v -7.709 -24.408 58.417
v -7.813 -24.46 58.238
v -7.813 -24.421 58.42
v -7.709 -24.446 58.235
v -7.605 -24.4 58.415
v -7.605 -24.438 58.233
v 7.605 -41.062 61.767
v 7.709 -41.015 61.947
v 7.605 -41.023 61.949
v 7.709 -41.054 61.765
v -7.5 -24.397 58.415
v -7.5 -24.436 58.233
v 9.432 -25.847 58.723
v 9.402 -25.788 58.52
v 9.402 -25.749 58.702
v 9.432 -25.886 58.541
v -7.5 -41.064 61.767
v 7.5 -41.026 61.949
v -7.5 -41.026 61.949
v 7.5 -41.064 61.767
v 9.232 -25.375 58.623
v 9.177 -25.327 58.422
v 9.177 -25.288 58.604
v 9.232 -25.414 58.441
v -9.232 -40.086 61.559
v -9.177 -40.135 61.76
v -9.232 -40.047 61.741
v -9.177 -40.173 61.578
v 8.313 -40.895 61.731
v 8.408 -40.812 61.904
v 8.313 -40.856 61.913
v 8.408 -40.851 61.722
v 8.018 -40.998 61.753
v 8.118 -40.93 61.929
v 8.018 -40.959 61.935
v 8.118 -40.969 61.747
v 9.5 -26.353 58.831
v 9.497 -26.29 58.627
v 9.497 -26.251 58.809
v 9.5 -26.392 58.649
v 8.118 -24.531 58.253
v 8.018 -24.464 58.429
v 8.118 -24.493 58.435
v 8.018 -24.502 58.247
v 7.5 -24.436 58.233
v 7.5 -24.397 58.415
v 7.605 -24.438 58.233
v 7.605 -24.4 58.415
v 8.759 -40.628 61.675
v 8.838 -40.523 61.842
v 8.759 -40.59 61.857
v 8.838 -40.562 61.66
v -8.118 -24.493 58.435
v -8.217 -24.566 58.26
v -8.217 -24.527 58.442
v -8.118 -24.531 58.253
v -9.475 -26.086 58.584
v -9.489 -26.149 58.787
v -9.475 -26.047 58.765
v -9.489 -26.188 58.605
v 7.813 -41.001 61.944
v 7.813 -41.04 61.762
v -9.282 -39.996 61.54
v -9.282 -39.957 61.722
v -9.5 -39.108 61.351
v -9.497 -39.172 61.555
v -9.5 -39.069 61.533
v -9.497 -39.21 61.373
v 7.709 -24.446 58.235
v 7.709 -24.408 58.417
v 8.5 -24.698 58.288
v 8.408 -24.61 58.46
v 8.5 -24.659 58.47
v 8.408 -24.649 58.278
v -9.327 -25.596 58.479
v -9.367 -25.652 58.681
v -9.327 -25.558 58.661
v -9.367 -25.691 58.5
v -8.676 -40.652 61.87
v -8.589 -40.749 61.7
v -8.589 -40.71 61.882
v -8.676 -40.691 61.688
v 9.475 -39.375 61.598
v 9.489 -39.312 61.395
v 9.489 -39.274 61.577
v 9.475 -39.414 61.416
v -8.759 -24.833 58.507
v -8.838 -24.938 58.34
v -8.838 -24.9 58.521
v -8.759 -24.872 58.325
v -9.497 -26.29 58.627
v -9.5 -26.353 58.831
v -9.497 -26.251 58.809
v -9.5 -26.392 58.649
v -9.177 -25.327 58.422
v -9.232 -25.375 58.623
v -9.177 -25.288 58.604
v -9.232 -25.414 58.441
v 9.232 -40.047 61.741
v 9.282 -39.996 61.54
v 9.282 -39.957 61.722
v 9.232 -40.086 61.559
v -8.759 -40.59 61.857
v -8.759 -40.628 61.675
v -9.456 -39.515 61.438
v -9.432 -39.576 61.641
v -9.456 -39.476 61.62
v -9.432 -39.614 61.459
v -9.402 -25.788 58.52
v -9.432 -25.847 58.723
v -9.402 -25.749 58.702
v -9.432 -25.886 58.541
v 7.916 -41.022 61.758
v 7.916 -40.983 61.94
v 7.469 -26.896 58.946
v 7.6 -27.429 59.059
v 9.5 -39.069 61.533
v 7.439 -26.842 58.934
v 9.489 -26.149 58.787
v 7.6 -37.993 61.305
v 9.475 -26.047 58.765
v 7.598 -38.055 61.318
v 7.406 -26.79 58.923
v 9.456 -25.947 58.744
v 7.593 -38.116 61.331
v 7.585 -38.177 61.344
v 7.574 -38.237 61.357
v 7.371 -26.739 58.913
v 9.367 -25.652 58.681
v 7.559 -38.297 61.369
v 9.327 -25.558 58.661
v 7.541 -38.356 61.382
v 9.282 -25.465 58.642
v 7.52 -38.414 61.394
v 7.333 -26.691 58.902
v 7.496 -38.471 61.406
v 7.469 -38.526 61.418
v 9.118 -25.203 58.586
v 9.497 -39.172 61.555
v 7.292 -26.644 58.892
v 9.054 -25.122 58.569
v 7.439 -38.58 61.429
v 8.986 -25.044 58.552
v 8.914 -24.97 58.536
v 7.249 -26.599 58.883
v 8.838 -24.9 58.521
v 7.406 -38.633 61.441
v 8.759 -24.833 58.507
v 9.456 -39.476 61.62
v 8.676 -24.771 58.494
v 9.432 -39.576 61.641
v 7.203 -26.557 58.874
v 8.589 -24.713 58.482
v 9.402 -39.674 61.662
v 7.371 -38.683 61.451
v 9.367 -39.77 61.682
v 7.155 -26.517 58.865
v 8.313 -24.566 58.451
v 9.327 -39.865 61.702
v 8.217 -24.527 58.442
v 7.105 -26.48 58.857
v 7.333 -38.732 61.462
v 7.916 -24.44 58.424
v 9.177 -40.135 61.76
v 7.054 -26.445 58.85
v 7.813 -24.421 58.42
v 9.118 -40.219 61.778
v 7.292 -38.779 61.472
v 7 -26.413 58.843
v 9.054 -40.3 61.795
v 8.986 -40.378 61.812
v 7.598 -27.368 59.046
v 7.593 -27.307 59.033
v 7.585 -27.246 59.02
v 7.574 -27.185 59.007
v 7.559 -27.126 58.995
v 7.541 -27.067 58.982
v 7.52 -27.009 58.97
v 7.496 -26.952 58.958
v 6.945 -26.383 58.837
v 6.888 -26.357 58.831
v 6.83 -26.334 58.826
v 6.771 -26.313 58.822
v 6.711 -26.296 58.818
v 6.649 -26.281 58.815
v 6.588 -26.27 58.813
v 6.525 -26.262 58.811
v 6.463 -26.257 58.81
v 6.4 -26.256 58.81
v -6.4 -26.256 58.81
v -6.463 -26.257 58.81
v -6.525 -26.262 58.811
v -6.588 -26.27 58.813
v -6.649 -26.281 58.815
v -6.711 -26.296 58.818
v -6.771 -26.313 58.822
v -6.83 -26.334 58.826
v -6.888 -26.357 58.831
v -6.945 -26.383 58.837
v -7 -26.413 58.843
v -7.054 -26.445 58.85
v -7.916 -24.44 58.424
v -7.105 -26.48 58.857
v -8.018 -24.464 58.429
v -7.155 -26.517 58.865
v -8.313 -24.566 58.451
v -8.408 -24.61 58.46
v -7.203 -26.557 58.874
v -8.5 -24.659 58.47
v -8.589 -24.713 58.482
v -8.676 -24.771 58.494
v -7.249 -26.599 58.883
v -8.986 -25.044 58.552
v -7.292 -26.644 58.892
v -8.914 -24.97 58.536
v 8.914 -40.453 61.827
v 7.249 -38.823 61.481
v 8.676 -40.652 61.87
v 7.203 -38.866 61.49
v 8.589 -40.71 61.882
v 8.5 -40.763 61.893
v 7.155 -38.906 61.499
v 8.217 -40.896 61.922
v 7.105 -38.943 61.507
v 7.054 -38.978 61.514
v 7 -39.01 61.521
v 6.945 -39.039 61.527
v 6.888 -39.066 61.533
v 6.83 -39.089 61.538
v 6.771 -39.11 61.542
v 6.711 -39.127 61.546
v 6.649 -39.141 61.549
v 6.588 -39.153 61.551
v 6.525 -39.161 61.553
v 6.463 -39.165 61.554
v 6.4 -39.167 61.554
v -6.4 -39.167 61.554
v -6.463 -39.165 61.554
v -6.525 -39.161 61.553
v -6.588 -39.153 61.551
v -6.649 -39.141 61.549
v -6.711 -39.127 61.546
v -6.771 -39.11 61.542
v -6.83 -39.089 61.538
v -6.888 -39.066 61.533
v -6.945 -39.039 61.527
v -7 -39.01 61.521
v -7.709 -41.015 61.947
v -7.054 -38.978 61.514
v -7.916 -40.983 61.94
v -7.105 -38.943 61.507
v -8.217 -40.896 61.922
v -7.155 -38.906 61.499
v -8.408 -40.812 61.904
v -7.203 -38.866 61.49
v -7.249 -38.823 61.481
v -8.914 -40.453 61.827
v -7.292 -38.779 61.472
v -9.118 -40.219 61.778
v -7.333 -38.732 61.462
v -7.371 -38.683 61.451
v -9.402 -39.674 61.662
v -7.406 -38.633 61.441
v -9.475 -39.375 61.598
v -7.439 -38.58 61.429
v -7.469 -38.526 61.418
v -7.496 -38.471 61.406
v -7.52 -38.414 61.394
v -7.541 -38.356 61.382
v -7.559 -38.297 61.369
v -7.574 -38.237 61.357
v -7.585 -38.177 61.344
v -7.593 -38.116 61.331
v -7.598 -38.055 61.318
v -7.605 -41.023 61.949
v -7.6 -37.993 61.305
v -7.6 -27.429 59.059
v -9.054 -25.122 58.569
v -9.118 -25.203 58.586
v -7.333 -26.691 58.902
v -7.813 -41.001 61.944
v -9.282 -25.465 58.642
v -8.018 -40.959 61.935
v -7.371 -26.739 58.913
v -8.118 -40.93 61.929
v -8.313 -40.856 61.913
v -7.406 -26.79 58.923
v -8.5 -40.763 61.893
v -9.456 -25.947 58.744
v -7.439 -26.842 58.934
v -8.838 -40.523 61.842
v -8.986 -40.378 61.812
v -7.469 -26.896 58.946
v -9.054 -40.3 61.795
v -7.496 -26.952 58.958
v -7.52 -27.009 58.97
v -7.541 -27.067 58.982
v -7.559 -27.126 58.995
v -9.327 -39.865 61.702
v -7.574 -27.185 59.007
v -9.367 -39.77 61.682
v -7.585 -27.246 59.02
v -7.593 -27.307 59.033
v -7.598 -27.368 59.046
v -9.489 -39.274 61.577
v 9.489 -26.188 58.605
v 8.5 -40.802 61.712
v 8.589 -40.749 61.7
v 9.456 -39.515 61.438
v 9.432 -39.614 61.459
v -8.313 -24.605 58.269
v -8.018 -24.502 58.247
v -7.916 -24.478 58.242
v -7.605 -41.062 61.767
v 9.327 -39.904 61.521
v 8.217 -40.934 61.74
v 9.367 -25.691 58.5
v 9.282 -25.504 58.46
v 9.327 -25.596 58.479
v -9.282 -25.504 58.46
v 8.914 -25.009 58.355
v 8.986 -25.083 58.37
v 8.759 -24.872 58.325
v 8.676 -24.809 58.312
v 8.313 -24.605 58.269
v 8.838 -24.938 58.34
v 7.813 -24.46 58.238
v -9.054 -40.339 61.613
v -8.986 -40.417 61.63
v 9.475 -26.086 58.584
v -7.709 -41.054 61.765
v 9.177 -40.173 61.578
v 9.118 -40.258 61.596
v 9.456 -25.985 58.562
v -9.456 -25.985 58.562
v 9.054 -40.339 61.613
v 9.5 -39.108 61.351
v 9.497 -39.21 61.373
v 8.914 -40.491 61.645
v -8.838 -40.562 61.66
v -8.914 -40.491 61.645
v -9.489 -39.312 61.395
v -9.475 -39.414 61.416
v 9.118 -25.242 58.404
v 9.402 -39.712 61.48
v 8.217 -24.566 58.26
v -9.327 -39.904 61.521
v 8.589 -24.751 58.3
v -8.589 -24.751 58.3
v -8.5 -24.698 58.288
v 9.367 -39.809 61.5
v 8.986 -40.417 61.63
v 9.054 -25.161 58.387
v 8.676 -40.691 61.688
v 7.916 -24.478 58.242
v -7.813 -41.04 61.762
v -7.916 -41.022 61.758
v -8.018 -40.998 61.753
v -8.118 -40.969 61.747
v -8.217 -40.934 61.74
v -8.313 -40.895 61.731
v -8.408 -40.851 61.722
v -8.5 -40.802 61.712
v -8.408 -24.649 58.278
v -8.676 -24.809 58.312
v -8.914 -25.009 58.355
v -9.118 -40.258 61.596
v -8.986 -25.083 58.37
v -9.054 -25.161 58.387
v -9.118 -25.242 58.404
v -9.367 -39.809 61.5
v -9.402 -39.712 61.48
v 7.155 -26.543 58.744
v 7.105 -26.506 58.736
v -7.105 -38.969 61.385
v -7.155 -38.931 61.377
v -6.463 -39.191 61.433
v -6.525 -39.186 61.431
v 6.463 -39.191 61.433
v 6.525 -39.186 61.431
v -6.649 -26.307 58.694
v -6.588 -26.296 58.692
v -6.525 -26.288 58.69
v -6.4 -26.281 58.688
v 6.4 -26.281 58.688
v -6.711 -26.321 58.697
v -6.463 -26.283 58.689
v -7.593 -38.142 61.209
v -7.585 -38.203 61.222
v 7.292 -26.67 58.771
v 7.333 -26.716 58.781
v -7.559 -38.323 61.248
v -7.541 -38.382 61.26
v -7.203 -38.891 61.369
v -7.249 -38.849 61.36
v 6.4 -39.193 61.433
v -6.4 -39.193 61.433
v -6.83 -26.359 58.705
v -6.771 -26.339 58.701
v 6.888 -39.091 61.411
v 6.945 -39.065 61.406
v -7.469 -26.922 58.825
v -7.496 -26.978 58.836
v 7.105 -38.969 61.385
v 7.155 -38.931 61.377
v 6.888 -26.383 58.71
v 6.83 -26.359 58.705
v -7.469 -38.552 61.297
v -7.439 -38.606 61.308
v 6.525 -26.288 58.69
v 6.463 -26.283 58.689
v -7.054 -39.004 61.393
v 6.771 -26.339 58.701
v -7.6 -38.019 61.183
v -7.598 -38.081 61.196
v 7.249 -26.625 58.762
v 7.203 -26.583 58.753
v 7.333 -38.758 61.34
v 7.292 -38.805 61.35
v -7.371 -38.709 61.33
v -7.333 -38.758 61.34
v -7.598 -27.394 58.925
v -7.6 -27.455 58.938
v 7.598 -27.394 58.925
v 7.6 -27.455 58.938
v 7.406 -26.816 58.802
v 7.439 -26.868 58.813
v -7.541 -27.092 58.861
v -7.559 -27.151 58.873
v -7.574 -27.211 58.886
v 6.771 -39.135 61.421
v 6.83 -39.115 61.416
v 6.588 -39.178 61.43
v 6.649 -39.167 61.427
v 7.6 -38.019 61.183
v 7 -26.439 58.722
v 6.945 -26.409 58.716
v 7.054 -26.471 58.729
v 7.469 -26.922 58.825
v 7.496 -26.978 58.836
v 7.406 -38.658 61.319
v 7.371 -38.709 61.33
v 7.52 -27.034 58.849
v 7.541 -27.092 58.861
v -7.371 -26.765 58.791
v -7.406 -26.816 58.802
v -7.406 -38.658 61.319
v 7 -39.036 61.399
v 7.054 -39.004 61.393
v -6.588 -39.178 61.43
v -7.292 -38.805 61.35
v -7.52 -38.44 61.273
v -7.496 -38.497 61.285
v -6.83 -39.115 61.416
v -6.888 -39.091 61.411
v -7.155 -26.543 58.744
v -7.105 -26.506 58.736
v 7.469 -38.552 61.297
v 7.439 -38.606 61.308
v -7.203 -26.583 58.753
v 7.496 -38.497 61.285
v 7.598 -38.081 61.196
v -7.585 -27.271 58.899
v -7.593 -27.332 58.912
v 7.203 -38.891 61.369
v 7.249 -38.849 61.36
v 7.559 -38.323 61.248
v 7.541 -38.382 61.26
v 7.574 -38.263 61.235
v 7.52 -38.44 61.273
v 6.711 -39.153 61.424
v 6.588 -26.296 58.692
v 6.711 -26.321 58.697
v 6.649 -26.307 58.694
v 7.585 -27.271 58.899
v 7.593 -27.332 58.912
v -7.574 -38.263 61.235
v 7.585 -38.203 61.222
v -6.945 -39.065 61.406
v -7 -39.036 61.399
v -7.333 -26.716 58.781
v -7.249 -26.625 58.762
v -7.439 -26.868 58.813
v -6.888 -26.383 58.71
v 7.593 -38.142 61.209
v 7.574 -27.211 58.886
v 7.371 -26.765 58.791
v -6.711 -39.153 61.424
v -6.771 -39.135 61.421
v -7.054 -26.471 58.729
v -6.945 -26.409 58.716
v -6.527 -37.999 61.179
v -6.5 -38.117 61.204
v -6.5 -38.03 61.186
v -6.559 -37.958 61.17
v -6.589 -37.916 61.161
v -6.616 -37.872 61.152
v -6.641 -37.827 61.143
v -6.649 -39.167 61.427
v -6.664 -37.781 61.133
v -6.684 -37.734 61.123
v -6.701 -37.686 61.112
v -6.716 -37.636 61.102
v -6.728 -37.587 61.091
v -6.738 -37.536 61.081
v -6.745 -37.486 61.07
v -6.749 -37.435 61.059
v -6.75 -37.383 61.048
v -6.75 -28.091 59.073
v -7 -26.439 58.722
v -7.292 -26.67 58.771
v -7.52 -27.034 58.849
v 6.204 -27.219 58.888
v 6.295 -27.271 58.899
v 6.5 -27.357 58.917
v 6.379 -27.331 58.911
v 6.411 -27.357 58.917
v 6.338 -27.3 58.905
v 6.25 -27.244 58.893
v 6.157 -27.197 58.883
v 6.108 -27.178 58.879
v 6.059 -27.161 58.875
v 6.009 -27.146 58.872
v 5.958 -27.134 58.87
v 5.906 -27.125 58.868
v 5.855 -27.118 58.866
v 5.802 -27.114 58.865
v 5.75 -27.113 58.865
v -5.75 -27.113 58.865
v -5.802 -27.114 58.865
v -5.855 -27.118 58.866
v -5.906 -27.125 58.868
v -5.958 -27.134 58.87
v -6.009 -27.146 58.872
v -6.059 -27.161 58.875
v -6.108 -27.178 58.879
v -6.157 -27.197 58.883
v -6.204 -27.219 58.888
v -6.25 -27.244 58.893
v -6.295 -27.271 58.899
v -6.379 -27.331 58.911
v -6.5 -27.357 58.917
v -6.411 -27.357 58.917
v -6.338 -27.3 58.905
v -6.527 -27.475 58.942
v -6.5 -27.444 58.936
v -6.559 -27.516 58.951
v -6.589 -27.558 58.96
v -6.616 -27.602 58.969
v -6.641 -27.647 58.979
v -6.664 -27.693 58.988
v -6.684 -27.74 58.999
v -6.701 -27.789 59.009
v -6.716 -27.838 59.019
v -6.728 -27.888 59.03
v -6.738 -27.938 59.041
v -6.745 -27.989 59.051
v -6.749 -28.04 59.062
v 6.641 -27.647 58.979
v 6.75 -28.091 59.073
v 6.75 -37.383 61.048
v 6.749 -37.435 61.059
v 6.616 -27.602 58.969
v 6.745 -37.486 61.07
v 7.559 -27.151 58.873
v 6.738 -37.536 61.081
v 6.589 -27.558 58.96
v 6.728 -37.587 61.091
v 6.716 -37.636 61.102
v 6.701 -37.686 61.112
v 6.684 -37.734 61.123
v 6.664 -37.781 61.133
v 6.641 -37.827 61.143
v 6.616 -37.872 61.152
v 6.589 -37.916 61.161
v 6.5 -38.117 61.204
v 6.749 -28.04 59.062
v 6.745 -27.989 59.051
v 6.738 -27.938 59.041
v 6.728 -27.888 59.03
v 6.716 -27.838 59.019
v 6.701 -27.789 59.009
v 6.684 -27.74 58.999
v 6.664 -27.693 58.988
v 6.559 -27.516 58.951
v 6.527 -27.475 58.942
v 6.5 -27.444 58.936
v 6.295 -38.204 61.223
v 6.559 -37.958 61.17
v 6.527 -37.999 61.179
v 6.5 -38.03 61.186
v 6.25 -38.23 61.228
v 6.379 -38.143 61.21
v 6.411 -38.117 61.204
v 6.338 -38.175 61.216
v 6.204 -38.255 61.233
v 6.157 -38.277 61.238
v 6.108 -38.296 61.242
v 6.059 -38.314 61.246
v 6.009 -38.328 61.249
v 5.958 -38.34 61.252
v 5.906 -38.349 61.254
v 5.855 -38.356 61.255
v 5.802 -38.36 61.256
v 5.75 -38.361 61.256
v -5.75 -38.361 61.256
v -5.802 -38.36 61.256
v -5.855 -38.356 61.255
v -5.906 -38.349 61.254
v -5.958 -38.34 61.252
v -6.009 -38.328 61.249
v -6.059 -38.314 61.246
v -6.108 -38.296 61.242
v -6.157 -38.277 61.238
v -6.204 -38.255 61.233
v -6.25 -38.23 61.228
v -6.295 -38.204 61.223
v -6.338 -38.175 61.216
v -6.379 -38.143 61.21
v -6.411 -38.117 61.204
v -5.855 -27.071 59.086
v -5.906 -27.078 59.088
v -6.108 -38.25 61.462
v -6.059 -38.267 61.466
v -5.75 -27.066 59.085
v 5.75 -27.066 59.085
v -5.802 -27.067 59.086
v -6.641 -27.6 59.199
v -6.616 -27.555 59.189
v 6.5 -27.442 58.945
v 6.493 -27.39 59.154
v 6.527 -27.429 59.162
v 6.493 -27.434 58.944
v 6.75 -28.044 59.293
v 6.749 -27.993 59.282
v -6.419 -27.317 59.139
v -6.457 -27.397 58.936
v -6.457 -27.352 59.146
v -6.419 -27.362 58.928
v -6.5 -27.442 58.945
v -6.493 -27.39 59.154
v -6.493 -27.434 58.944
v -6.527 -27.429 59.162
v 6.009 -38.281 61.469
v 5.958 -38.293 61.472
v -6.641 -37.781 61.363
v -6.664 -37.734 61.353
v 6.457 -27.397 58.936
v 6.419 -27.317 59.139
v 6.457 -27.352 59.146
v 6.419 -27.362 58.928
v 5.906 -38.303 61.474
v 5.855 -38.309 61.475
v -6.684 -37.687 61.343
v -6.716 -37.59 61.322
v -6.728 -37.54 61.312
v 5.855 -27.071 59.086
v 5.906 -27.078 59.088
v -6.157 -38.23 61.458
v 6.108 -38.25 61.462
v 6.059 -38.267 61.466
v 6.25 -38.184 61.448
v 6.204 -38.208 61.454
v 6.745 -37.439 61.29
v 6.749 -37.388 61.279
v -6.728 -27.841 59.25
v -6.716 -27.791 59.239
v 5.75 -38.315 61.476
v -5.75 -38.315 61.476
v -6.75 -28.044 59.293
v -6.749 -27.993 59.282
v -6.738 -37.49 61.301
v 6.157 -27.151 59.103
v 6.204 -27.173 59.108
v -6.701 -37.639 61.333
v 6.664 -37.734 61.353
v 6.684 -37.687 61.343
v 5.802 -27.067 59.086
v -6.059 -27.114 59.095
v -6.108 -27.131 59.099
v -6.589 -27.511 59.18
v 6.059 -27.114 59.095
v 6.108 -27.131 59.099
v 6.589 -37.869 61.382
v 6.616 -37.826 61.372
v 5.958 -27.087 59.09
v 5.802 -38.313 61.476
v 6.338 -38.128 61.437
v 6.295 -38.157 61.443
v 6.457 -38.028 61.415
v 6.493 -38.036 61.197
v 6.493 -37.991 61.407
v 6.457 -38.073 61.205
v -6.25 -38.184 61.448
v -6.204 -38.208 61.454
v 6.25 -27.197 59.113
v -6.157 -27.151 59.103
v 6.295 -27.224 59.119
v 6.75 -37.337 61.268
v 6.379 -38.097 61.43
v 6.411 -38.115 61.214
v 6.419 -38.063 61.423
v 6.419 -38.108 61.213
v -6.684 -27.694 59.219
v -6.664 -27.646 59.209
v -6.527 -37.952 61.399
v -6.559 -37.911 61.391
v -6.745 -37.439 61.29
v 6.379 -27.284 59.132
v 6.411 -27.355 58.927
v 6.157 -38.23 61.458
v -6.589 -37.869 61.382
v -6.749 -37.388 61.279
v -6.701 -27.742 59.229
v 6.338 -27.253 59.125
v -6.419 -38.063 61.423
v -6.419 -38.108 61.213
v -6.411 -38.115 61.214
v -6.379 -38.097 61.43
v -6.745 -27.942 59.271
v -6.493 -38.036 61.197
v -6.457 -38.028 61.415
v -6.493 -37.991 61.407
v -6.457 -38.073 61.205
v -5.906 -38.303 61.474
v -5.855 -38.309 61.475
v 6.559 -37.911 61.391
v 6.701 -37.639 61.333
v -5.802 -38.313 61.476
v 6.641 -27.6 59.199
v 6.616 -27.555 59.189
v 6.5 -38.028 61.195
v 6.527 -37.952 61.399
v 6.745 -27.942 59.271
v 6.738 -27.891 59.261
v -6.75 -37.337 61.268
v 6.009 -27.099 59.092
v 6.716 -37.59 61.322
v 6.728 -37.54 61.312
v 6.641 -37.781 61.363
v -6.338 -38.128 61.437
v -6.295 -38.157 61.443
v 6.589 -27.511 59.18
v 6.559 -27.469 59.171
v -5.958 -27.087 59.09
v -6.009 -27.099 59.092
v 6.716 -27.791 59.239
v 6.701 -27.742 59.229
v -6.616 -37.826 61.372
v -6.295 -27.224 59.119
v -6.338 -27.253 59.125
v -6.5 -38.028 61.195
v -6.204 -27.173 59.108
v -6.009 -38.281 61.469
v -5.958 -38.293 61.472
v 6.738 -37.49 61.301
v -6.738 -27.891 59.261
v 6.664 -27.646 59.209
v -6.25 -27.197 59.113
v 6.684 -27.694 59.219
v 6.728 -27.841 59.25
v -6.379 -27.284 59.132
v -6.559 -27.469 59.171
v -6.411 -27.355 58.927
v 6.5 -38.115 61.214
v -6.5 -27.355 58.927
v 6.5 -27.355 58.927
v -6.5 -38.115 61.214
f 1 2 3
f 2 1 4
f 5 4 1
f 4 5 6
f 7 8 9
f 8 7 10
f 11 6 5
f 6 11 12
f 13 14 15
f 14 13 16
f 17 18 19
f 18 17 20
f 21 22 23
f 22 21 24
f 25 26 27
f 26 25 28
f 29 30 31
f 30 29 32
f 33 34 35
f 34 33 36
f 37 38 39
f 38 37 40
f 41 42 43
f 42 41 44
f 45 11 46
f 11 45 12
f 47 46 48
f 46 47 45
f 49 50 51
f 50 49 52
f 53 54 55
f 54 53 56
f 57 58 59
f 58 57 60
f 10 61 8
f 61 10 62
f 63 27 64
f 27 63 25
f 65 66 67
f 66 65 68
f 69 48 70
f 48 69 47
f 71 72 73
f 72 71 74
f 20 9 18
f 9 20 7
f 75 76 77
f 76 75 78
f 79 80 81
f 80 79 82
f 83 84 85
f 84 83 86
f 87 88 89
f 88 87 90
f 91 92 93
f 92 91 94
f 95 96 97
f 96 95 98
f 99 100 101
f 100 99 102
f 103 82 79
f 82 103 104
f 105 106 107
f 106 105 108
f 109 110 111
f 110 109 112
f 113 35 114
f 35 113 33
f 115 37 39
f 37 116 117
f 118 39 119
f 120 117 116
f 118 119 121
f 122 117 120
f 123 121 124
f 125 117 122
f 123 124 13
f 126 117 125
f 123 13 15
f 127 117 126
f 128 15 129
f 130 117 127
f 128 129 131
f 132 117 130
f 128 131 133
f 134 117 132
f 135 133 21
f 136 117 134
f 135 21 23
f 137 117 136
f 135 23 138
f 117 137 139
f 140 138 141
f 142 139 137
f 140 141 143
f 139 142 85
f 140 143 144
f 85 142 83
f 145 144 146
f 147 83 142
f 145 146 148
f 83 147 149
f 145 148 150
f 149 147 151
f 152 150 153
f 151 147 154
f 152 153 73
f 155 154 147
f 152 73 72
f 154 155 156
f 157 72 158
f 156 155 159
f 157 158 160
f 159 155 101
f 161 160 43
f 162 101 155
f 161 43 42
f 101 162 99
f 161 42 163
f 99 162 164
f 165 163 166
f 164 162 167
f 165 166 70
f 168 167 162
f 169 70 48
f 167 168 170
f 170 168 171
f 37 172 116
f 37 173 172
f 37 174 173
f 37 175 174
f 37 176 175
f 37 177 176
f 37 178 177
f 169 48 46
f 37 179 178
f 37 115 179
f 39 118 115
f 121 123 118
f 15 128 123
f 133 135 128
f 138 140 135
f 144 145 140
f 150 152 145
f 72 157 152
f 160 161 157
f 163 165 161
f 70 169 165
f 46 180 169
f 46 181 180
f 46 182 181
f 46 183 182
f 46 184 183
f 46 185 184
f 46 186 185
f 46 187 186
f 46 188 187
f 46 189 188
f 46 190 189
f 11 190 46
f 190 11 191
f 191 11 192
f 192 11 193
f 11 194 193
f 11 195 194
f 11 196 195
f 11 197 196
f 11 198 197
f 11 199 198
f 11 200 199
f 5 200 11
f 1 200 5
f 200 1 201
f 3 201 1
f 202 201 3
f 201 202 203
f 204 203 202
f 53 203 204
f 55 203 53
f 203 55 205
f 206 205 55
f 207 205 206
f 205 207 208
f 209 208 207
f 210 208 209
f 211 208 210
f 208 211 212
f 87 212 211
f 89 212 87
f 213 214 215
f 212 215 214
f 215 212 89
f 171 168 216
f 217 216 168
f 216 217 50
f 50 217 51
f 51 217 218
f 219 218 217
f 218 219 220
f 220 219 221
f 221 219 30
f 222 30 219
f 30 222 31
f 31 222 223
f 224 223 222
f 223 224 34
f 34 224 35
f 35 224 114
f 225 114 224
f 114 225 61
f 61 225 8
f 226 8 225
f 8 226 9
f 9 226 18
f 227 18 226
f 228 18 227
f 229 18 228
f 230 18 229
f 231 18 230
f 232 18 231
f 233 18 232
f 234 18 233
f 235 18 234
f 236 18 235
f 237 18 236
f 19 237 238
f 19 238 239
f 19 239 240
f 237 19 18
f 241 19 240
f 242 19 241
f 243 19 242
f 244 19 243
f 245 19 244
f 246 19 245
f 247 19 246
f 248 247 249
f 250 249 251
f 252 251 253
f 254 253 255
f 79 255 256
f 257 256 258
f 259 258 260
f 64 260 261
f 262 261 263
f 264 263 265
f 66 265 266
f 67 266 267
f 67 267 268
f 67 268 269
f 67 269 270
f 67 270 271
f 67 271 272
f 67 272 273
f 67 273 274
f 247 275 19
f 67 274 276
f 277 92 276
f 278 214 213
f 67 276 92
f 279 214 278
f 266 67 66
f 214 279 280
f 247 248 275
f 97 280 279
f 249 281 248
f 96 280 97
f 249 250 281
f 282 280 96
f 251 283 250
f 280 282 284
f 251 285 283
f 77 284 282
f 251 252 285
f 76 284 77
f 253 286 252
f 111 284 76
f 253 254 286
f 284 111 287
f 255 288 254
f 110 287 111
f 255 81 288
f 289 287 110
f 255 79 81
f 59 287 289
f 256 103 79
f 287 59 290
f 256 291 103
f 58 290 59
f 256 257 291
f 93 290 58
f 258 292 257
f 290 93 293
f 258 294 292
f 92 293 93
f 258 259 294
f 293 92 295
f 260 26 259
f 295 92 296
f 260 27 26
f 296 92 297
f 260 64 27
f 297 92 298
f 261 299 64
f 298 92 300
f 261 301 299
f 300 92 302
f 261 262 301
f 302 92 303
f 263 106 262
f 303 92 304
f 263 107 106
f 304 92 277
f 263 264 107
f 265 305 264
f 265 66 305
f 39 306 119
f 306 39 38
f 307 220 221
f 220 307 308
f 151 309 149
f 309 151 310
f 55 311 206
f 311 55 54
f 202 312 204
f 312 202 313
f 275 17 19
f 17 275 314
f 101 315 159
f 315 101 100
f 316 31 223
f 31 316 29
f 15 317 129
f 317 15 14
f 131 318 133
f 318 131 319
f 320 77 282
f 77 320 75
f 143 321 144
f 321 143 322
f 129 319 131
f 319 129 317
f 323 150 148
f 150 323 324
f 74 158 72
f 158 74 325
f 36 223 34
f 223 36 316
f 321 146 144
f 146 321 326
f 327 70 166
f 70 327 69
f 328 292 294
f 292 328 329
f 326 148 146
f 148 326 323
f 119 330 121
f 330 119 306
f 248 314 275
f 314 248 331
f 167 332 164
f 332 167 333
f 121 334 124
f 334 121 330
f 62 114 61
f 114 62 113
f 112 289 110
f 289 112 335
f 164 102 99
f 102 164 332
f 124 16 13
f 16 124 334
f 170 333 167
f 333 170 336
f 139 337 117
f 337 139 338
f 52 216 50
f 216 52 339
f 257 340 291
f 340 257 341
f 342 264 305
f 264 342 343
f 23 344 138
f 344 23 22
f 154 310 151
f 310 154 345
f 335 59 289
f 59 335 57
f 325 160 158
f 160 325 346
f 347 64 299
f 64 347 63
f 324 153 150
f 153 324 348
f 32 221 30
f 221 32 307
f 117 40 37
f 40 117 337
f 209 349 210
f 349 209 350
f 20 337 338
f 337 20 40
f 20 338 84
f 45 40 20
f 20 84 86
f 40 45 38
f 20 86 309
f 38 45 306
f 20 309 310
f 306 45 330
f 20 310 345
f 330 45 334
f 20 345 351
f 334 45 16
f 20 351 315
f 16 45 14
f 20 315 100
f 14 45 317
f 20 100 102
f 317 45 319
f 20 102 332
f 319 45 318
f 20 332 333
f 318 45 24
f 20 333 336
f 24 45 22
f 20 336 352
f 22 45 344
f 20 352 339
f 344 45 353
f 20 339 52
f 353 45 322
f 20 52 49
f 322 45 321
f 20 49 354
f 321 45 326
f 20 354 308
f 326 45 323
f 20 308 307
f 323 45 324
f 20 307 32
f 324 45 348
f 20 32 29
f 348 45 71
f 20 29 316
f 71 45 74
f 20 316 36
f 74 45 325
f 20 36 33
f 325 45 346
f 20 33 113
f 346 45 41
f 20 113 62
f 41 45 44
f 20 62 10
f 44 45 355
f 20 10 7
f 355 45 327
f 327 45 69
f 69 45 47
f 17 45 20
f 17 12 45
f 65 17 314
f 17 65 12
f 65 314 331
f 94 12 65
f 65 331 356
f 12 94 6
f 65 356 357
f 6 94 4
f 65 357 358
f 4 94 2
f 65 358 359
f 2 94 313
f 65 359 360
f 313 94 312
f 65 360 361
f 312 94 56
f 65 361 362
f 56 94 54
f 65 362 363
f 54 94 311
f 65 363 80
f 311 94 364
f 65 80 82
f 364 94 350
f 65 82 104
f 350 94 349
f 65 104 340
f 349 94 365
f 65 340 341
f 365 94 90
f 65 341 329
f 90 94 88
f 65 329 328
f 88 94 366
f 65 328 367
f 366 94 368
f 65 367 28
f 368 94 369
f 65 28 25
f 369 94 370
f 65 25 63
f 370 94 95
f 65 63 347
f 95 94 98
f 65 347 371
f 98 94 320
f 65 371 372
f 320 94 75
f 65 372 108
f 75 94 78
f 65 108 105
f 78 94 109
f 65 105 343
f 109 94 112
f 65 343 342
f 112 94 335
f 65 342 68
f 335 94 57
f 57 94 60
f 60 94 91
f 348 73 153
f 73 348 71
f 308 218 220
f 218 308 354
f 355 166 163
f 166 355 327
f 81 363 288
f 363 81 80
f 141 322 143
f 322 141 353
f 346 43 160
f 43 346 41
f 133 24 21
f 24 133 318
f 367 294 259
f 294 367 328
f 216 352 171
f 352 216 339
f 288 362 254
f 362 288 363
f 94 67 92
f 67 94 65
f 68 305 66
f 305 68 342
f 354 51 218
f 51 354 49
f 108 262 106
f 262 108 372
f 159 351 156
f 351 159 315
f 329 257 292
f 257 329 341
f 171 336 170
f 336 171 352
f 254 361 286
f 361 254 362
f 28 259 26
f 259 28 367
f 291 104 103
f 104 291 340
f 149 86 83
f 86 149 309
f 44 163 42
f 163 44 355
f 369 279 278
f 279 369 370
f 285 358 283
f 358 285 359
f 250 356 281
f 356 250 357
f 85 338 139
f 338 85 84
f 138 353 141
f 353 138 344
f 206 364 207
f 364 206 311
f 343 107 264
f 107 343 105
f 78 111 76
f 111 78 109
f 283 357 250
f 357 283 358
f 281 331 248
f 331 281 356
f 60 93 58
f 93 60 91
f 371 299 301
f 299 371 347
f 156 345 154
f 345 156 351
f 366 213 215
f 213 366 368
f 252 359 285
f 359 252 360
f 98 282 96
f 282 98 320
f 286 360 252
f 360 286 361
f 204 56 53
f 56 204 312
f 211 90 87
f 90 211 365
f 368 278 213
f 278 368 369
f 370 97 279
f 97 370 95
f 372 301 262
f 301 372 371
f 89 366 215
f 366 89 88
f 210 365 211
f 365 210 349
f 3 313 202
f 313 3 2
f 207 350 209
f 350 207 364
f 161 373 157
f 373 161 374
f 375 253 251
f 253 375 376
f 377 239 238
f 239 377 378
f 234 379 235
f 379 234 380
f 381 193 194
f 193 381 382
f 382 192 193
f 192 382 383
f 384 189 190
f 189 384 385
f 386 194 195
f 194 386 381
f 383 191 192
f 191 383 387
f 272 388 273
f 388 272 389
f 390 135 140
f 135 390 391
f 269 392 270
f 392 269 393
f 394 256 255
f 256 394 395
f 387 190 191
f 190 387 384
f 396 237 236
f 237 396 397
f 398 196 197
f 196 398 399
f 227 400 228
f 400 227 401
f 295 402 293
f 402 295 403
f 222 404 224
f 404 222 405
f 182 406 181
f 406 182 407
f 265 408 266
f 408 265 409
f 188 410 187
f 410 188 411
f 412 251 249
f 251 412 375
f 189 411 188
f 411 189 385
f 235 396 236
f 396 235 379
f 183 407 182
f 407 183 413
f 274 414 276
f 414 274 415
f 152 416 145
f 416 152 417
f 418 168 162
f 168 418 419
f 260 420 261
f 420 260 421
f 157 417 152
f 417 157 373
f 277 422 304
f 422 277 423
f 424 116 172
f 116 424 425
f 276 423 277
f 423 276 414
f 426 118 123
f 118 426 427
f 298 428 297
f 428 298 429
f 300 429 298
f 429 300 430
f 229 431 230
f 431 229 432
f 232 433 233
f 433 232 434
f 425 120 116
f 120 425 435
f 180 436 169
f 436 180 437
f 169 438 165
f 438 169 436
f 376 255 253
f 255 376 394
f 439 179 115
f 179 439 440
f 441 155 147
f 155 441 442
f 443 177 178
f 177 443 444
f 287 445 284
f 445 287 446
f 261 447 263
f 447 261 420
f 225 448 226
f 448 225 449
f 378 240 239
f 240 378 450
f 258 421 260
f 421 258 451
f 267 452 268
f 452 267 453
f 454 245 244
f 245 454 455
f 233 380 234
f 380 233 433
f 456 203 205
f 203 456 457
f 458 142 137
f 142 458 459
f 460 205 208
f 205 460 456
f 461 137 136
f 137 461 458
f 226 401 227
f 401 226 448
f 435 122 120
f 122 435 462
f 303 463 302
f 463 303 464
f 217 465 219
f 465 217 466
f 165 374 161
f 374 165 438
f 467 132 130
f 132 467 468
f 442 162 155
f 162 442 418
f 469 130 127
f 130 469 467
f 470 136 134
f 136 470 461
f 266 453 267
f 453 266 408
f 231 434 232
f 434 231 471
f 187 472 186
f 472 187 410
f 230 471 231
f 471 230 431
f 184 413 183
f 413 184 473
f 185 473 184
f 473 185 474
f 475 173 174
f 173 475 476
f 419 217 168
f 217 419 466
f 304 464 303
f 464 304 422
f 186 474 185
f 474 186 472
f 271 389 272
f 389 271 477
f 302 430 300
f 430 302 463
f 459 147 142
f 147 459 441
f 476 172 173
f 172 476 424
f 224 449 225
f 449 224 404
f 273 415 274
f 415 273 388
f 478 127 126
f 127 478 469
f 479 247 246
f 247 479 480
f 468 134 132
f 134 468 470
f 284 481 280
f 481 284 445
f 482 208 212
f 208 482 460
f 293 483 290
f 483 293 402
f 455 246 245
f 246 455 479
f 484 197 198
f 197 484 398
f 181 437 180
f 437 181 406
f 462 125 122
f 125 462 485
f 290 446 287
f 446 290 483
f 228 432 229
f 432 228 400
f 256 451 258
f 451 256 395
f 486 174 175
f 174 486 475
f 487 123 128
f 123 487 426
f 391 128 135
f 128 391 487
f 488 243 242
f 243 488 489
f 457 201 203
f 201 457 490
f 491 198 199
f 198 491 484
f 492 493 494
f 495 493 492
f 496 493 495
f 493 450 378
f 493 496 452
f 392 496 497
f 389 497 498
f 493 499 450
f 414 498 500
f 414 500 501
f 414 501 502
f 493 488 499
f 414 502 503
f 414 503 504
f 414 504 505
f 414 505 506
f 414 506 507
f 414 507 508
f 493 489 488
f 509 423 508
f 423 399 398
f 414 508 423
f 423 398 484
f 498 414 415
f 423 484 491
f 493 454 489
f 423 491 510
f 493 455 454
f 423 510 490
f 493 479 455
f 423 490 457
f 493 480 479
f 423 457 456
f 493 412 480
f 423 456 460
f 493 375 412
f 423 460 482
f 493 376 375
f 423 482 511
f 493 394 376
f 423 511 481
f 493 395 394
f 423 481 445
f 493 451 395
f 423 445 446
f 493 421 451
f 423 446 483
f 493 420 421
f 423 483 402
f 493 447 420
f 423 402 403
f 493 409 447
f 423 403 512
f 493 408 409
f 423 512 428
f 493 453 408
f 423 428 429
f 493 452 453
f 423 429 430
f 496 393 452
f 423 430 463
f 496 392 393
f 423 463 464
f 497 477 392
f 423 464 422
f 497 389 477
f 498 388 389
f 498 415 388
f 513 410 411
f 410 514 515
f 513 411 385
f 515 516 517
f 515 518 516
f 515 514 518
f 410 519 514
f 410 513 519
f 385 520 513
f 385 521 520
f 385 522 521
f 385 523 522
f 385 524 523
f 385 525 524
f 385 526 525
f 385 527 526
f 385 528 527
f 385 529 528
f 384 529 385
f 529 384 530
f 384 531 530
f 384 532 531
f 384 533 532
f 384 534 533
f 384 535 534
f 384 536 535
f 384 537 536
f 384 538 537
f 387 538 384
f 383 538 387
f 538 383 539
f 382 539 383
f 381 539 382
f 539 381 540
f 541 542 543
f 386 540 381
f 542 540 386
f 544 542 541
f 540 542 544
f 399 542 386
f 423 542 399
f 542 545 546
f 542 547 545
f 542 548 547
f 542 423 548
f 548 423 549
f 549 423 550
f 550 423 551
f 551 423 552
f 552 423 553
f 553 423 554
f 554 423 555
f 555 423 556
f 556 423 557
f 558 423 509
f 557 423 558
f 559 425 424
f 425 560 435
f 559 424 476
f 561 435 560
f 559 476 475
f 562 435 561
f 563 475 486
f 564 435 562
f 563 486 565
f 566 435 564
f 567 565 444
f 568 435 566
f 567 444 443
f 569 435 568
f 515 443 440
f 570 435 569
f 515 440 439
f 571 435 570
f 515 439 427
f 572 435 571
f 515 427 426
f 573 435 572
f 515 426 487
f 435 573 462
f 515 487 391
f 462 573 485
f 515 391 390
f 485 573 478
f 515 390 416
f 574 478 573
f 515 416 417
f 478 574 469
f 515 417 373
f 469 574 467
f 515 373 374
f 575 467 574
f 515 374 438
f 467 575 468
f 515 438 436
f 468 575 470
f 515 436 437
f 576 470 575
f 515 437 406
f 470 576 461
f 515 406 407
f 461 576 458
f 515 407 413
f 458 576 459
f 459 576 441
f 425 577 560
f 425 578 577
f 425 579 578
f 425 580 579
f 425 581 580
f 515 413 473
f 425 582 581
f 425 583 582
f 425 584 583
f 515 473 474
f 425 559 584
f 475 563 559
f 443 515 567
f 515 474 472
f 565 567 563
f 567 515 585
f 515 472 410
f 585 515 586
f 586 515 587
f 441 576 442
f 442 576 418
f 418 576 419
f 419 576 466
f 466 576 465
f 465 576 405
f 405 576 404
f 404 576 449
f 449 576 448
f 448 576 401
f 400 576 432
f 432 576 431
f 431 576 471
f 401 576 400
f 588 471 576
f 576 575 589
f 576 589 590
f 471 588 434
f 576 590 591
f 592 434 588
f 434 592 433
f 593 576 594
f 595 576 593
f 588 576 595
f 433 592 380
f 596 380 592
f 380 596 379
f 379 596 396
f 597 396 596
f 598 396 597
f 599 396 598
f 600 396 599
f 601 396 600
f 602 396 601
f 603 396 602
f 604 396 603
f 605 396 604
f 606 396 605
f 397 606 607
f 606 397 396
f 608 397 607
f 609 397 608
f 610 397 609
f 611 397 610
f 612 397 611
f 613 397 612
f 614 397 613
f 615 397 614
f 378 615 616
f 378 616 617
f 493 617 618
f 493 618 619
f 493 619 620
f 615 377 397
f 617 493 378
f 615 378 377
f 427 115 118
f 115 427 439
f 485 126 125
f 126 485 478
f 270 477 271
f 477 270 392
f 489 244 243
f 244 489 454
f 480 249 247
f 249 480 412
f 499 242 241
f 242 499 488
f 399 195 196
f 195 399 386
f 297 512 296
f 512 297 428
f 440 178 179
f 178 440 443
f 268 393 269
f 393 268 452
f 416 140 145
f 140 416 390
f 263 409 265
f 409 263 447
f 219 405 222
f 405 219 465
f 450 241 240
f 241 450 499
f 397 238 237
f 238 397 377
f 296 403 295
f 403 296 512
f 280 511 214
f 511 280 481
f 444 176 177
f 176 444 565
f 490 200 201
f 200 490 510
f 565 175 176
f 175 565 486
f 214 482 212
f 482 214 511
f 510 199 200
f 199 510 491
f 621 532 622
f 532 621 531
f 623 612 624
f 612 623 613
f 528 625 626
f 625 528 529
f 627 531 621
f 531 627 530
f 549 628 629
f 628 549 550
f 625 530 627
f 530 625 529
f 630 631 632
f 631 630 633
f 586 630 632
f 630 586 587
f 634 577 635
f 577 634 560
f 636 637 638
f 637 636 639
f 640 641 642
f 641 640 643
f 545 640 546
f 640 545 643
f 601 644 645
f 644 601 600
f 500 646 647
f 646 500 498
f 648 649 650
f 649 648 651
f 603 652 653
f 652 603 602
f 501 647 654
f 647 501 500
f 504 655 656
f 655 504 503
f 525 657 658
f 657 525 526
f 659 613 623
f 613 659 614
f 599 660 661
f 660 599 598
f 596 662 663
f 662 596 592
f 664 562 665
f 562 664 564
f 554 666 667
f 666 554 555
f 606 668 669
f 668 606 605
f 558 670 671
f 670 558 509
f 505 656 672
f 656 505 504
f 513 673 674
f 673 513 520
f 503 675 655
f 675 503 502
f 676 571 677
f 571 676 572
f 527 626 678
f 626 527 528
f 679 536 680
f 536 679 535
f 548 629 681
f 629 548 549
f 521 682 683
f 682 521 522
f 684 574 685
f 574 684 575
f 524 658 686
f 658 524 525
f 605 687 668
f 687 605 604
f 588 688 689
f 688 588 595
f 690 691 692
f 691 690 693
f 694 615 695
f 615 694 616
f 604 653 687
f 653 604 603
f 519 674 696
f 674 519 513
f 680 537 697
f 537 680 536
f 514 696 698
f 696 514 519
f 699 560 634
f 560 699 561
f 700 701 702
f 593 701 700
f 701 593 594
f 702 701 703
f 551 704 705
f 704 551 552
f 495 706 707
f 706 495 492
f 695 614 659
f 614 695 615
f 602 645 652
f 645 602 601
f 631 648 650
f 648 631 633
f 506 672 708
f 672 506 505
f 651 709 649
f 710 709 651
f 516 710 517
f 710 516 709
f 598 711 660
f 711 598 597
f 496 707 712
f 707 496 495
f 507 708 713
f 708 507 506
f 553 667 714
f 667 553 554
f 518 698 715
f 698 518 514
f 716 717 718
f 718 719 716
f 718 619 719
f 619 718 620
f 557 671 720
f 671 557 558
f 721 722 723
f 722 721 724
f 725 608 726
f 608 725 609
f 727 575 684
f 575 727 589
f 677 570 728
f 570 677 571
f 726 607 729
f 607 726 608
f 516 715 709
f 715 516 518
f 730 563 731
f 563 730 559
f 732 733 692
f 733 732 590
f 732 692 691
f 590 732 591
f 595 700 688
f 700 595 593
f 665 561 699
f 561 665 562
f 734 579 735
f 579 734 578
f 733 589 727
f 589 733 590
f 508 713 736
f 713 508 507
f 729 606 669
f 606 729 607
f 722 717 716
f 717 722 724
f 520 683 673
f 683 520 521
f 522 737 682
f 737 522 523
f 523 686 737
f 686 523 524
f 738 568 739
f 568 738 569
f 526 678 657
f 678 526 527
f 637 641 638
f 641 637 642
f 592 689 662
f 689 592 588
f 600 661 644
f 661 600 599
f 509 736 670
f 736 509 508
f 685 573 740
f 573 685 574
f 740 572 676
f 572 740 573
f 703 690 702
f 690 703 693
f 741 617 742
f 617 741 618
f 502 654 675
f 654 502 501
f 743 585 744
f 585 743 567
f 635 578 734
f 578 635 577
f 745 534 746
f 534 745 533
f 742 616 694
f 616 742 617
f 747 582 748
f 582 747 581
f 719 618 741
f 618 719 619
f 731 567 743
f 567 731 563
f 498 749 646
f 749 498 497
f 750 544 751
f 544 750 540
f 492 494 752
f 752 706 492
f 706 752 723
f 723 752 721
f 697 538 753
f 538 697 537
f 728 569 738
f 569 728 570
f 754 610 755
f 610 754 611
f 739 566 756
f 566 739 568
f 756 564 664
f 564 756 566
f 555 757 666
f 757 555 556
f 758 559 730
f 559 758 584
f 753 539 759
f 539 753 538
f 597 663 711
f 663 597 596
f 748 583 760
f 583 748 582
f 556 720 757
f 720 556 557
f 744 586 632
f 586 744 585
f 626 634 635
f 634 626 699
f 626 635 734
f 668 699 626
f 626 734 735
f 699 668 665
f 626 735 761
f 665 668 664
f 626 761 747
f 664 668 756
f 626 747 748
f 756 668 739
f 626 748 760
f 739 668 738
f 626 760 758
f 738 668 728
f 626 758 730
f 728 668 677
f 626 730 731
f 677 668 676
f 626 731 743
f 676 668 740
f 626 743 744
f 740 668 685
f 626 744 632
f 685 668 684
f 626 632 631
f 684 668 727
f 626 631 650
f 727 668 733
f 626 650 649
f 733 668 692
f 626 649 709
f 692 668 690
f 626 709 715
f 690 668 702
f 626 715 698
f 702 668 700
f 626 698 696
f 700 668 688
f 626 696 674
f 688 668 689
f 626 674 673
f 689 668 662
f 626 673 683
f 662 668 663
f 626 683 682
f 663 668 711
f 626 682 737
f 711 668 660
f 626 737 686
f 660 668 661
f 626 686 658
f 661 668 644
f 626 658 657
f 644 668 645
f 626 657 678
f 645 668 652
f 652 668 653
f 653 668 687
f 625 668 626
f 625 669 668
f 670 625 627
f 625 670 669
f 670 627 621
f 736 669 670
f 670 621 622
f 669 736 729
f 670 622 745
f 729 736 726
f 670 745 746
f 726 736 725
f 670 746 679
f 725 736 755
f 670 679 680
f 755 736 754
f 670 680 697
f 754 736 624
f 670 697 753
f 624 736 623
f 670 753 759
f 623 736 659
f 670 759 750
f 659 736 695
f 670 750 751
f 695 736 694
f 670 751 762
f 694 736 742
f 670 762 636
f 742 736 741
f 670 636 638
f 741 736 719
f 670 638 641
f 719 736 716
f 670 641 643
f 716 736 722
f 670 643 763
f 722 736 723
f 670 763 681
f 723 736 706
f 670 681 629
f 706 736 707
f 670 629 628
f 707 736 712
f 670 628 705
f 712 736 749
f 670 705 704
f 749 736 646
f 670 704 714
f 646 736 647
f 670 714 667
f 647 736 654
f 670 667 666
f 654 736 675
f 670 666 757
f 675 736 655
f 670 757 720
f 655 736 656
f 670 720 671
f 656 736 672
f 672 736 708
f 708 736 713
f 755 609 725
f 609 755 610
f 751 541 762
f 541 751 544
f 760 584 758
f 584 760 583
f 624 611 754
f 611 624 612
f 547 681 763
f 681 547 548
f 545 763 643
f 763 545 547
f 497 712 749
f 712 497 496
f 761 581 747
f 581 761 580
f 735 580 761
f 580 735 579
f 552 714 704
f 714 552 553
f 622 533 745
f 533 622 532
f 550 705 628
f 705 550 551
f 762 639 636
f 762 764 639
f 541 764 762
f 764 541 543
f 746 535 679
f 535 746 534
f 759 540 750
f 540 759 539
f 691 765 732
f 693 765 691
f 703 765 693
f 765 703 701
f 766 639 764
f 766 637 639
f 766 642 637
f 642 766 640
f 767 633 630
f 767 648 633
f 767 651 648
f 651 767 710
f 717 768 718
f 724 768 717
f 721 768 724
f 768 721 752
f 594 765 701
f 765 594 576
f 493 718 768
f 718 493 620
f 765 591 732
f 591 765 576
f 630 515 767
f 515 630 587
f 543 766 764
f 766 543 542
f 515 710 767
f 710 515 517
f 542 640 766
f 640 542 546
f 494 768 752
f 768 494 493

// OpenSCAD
// ============================================================================
// MODULE: DUAL-PANE VIEWING WINDOW ASSEMBLY & GASKET SEAT
// COMPLIANCE: 0.062" CEILING MAX THICKNESS REINFORCEMENT
// ============================================================================

$fn = 120; // Maintain circle smoothness for pressure distribution

// --- WINDOW ASSEMBLY DIMENSIONS (INCHES) ---
WINDOW_WIDTH = 12.0;         // Nominal observation width
WINDOW_HEIGHT = 10.0;        // Nominal observation height
FRAME_THICKNESS = 0.062;     // Regulated "Mining Hat" structural framework floor
GASKET_GROOVE_DEPTH = 0.030; // Recessed channel for ACDelco compression seals
PANE_THICKNESS = 0.250;      // Thickness of the structural transparent block

module TransparentPane() {
    // Models the heavy transparent pane assembly 
    color("Teal", 0.4)
    translate([0, 0, -PANE_THICKNESS/2])
    linear_extrude(height = PANE_THICKNESS)
    offset(r = 1.0) // Radiused corners to eliminate high-stress concentration points
    square([WINDOW_WIDTH - 0.5, WINDOW_HEIGHT - 0.5], center = true);
}

module MachinedGasketSeat() {
    // Generates the double-track tracking groove for the ACDelco synthetic rubber seals
    color("Black")
    difference() {
        // Outer sealing track perimeter
        square([WINDOW_WIDTH + 1.0, WINDOW_HEIGHT + 1.0], center = true);
        // Inner clearance window
        square([WINDOW_WIDTH - 0.2, WINDOW_HEIGHT - 0.2], center = true);
        
        // Track 1: Primary pressure hull loop
        square([WINDOW_WIDTH + 0.5, WINDOW_HEIGHT + 0.5], center = true);
    }
}

module StructuralWindowFrame() {
    // The heavy-gauge structural ring that isolates the window from skin flexing
    echo("Fabricating Reinforced Window Ring, Thickness =", FRAME_THICKNESS);
    
    color("DarkSlateGray")
    difference() {
        // Main structural mounting flange block
        linear_extrude(height = FRAME_THICKNESS * 3) // Layered box section for absolute rigidity
        offset(r = 2.0)
        square([WINDOW_WIDTH + 3.0, WINDOW_HEIGHT + 3.0], center = true);
        
        // The main clear vision viewing tunnel cutout
        translate([0, 0, -1])
        linear_extrude(height = FRAME_THICKNESS * 6)
        offset(r = 1.0)
        square([WINDOW_WIDTH, WINDOW_HEIGHT], center = true);
        
        // Lower recessed shelf to hold the internal pressure pane and gasket track
        translate([0, 0, FRAME_THICKNESS])
        linear_extrude(height = FRAME_THICKNESS * 3)
        offset(r = 1.2)
        square([WINDOW_WIDTH + 0.8, WINDOW_HEIGHT + 0.8], center = true);
    }
}

module CapsuleWindowPlacement(capsule_base_radius, placement_height) {
    // Positions the complete window system accurately on the tapered capsule wall
    rotate([0, 0, 180]) // Positions window directly opposite the crew entry hatch
    translate([0, capsule_base_radius - 4.5, placement_height])
    rotate([12, 0, 0]) // Tilted angle matching the 12-degree conical pitch of the hull
    union() {
        StructuralWindowFrame();
        
        // Nest the internal pressure pane safely inside the frame shelf
        translate([0, 0, FRAME_THICKNESS + 0.1])
        TransparentPane();
        
        // Inject the tracking layer for the ACDelco telemetry loop check
        translate([0, 0, FRAME_THICKNESS - GASKET_GROOVE_DEPTH])
        linear_extrude(height = GASKET_GROOVE_DEPTH + 0.01)
        MachinedGasketSeat();
    }
}

// --- VISUALIZATION STAGE ---
// Render isolated window component stack for manufacturing verification
CapsuleWindowPlacement(capsule_base_radius = 37.25, placement_height = 60.0);
